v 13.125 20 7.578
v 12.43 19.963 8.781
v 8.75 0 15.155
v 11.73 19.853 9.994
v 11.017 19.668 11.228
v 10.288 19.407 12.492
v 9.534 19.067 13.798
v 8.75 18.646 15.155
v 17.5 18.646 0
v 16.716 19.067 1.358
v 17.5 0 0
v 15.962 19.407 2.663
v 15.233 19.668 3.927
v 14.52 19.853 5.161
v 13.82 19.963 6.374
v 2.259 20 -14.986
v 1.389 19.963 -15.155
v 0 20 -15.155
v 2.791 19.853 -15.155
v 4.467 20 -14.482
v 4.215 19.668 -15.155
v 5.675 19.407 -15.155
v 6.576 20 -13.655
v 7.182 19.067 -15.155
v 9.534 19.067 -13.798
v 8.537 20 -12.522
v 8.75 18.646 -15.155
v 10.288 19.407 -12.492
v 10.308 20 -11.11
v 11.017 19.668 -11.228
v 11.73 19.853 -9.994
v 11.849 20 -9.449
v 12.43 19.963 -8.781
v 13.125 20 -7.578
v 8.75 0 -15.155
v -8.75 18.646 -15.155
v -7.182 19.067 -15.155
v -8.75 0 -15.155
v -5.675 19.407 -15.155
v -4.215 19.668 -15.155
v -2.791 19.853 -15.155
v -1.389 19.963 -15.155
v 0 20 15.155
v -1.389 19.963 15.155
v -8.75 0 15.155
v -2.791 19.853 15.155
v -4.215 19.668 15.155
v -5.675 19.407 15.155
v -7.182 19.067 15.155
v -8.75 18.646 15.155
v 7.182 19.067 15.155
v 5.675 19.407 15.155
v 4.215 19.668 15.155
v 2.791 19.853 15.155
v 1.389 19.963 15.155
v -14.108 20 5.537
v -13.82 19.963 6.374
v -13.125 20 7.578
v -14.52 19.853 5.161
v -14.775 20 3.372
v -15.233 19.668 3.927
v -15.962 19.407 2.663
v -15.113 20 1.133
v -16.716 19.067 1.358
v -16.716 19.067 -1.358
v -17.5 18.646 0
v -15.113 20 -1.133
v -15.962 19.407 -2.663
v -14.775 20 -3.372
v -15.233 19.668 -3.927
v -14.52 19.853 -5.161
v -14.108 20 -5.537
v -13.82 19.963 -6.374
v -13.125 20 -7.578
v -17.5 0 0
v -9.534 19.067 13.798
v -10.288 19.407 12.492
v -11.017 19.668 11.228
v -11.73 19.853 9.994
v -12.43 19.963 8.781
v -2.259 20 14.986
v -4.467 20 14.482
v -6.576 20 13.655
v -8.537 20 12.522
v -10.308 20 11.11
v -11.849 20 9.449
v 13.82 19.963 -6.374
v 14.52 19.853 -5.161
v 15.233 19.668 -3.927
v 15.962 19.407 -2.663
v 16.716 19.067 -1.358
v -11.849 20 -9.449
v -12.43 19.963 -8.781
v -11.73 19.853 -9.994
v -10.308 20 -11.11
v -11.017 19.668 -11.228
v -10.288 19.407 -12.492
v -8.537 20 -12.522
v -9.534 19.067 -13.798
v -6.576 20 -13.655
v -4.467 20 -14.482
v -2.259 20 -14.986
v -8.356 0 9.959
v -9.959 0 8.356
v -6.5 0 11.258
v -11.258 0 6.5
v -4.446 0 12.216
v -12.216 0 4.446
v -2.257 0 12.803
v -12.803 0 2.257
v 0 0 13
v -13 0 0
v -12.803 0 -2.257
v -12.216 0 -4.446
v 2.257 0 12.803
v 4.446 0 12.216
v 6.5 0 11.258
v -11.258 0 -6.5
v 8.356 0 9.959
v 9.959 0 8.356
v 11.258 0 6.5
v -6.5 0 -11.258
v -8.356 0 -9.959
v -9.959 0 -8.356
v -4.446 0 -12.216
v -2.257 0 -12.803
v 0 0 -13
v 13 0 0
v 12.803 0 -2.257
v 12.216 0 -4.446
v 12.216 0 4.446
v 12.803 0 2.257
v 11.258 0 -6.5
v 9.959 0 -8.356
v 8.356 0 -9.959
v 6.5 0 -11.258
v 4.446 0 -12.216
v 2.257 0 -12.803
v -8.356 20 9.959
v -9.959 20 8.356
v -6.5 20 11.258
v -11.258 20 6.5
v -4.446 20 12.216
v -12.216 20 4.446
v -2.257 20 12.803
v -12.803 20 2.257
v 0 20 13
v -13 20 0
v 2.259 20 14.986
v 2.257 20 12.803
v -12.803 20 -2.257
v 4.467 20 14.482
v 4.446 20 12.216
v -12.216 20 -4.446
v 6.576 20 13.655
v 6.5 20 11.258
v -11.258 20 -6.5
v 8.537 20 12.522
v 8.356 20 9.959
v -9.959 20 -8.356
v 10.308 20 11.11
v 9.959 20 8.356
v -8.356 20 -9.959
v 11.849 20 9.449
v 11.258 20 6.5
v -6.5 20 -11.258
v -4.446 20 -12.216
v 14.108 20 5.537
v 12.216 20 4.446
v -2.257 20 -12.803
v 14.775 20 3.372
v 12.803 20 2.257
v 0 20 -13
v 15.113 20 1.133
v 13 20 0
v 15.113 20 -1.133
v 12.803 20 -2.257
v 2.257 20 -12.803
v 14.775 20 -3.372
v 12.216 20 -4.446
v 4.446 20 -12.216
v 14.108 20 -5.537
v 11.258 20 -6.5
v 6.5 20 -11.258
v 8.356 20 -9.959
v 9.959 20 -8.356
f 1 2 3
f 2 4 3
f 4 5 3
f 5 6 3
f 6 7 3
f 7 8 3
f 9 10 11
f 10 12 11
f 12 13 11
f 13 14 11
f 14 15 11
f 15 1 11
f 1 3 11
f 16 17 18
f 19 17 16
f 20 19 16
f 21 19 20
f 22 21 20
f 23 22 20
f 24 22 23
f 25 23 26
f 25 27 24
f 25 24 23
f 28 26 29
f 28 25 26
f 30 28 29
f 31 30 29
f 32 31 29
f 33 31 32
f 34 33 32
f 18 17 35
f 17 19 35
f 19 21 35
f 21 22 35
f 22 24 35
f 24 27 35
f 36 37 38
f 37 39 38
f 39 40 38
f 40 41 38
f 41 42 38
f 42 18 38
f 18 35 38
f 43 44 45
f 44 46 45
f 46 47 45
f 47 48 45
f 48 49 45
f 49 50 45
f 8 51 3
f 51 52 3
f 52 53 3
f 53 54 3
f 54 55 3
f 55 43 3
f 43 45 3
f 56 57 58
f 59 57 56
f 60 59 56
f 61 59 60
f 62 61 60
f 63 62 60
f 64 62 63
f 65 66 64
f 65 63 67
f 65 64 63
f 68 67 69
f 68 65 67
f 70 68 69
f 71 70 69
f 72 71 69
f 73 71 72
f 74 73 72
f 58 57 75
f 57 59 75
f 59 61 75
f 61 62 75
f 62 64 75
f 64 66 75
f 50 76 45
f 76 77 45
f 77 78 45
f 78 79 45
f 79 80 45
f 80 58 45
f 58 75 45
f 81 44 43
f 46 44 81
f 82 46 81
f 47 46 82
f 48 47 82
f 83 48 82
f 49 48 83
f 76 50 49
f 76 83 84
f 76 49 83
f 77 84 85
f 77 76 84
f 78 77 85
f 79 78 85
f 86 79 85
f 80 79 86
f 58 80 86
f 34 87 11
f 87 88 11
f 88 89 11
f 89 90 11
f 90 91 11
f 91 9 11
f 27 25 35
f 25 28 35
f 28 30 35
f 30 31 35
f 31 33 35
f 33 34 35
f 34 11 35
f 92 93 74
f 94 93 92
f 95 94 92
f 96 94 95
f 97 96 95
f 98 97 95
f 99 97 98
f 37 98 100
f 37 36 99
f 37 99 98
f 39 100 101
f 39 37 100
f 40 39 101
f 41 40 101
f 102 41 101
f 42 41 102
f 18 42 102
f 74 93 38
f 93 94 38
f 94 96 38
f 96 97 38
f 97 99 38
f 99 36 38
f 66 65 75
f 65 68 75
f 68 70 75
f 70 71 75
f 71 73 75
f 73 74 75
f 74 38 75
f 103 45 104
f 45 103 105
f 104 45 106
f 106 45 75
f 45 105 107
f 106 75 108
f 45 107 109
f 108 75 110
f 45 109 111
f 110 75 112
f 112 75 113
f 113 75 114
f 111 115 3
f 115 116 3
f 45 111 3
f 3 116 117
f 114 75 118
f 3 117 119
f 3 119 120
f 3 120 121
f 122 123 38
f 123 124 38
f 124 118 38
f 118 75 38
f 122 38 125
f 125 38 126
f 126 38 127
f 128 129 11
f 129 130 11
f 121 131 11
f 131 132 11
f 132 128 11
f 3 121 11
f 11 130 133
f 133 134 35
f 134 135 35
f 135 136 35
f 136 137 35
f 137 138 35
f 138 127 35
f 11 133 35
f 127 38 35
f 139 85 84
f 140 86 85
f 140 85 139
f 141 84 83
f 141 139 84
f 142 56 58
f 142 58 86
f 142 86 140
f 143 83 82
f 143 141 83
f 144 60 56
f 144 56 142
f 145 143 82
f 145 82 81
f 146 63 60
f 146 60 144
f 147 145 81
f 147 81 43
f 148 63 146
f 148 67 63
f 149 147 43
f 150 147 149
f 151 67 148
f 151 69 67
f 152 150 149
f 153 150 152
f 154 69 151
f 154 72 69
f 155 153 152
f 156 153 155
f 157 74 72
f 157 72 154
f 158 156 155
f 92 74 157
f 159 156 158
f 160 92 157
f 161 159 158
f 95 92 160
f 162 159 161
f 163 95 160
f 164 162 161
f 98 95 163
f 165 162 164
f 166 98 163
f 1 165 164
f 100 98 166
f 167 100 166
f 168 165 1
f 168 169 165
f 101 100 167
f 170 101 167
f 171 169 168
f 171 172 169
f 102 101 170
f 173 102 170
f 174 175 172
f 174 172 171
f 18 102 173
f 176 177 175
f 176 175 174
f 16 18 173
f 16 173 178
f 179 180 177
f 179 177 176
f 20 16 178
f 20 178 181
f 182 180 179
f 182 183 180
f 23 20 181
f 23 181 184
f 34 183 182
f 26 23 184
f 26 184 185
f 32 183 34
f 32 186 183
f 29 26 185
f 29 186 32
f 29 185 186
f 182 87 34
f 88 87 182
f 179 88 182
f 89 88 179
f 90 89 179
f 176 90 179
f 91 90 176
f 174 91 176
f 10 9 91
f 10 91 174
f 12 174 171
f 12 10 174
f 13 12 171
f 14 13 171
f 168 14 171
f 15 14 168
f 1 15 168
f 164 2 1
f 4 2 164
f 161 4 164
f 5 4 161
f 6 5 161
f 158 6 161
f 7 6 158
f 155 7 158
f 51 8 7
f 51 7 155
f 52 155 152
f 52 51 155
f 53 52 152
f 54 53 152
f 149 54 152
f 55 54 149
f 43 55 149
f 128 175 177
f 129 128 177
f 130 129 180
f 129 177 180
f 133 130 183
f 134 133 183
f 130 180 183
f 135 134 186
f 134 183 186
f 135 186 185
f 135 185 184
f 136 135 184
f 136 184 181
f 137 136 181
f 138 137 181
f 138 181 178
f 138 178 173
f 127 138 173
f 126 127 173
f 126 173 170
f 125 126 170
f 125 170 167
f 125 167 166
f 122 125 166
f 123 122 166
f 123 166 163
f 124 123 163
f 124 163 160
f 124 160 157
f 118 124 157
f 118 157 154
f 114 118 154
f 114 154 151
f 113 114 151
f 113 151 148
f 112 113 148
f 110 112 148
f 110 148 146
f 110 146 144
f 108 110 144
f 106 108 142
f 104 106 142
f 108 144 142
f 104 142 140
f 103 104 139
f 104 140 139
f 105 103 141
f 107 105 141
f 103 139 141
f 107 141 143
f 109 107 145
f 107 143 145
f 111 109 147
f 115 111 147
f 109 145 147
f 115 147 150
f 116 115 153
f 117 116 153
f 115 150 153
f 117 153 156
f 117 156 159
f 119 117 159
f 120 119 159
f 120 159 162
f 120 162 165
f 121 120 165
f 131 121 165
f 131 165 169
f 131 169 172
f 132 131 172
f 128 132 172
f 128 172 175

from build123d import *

# Parameters (mm, degrees)
BOSS_EXTRUDE1_DEPTH = 20
SKETCH2_OUTSIDE_W   = 116.37
SKETCH2_OUTSIDE_H   = 111.68
SKETCH2_OUTSIDE_R   = 15.155444566
CUT_EXTRUDE1_DEPTH  = 20
CUT_EXTRUDE1_TAPER  = 60
SKETCH3_R           = 13
CUT_EXTRUDE2_DEPTH  = 21


with BuildPart() as part:
    # Sketch1 → Boss-Extrude1 (new body)
    with BuildSketch(Plane(origin=(0, 0, 0), x_dir=(1, 0, 0), z_dir=(0, 1, 0))):
        Polygon((17.5, 0), (8.75, 15.155444566), (-8.75, 15.155444566), (-17.5, 0), (-8.75, -15.155444566), (8.75, -15.155444566), align=None)
    extrude(amount=BOSS_EXTRUDE1_DEPTH)

    # Sketch2 outside → Cut-Extrude1 (cut)
    with BuildSketch(Plane(origin=(0, 20, 0), x_dir=(1, 0, 0), z_dir=(0, 1, 0))):
        Rectangle(SKETCH2_OUTSIDE_W, SKETCH2_OUTSIDE_H)
        Circle(SKETCH2_OUTSIDE_R, mode=Mode.SUBTRACT)
    extrude(amount=-CUT_EXTRUDE1_DEPTH, taper=CUT_EXTRUDE1_TAPER, mode=Mode.SUBTRACT)

    # Sketch3 → Cut-Extrude2 (cut, through all)
    with BuildSketch(Plane(origin=(0, 20, 0), x_dir=(1, 0, 0), z_dir=(0, 1, 0))):
        Circle(SKETCH3_R)
    extrude(amount=-CUT_EXTRUDE2_DEPTH, mode=Mode.SUBTRACT)


solid = part.part
